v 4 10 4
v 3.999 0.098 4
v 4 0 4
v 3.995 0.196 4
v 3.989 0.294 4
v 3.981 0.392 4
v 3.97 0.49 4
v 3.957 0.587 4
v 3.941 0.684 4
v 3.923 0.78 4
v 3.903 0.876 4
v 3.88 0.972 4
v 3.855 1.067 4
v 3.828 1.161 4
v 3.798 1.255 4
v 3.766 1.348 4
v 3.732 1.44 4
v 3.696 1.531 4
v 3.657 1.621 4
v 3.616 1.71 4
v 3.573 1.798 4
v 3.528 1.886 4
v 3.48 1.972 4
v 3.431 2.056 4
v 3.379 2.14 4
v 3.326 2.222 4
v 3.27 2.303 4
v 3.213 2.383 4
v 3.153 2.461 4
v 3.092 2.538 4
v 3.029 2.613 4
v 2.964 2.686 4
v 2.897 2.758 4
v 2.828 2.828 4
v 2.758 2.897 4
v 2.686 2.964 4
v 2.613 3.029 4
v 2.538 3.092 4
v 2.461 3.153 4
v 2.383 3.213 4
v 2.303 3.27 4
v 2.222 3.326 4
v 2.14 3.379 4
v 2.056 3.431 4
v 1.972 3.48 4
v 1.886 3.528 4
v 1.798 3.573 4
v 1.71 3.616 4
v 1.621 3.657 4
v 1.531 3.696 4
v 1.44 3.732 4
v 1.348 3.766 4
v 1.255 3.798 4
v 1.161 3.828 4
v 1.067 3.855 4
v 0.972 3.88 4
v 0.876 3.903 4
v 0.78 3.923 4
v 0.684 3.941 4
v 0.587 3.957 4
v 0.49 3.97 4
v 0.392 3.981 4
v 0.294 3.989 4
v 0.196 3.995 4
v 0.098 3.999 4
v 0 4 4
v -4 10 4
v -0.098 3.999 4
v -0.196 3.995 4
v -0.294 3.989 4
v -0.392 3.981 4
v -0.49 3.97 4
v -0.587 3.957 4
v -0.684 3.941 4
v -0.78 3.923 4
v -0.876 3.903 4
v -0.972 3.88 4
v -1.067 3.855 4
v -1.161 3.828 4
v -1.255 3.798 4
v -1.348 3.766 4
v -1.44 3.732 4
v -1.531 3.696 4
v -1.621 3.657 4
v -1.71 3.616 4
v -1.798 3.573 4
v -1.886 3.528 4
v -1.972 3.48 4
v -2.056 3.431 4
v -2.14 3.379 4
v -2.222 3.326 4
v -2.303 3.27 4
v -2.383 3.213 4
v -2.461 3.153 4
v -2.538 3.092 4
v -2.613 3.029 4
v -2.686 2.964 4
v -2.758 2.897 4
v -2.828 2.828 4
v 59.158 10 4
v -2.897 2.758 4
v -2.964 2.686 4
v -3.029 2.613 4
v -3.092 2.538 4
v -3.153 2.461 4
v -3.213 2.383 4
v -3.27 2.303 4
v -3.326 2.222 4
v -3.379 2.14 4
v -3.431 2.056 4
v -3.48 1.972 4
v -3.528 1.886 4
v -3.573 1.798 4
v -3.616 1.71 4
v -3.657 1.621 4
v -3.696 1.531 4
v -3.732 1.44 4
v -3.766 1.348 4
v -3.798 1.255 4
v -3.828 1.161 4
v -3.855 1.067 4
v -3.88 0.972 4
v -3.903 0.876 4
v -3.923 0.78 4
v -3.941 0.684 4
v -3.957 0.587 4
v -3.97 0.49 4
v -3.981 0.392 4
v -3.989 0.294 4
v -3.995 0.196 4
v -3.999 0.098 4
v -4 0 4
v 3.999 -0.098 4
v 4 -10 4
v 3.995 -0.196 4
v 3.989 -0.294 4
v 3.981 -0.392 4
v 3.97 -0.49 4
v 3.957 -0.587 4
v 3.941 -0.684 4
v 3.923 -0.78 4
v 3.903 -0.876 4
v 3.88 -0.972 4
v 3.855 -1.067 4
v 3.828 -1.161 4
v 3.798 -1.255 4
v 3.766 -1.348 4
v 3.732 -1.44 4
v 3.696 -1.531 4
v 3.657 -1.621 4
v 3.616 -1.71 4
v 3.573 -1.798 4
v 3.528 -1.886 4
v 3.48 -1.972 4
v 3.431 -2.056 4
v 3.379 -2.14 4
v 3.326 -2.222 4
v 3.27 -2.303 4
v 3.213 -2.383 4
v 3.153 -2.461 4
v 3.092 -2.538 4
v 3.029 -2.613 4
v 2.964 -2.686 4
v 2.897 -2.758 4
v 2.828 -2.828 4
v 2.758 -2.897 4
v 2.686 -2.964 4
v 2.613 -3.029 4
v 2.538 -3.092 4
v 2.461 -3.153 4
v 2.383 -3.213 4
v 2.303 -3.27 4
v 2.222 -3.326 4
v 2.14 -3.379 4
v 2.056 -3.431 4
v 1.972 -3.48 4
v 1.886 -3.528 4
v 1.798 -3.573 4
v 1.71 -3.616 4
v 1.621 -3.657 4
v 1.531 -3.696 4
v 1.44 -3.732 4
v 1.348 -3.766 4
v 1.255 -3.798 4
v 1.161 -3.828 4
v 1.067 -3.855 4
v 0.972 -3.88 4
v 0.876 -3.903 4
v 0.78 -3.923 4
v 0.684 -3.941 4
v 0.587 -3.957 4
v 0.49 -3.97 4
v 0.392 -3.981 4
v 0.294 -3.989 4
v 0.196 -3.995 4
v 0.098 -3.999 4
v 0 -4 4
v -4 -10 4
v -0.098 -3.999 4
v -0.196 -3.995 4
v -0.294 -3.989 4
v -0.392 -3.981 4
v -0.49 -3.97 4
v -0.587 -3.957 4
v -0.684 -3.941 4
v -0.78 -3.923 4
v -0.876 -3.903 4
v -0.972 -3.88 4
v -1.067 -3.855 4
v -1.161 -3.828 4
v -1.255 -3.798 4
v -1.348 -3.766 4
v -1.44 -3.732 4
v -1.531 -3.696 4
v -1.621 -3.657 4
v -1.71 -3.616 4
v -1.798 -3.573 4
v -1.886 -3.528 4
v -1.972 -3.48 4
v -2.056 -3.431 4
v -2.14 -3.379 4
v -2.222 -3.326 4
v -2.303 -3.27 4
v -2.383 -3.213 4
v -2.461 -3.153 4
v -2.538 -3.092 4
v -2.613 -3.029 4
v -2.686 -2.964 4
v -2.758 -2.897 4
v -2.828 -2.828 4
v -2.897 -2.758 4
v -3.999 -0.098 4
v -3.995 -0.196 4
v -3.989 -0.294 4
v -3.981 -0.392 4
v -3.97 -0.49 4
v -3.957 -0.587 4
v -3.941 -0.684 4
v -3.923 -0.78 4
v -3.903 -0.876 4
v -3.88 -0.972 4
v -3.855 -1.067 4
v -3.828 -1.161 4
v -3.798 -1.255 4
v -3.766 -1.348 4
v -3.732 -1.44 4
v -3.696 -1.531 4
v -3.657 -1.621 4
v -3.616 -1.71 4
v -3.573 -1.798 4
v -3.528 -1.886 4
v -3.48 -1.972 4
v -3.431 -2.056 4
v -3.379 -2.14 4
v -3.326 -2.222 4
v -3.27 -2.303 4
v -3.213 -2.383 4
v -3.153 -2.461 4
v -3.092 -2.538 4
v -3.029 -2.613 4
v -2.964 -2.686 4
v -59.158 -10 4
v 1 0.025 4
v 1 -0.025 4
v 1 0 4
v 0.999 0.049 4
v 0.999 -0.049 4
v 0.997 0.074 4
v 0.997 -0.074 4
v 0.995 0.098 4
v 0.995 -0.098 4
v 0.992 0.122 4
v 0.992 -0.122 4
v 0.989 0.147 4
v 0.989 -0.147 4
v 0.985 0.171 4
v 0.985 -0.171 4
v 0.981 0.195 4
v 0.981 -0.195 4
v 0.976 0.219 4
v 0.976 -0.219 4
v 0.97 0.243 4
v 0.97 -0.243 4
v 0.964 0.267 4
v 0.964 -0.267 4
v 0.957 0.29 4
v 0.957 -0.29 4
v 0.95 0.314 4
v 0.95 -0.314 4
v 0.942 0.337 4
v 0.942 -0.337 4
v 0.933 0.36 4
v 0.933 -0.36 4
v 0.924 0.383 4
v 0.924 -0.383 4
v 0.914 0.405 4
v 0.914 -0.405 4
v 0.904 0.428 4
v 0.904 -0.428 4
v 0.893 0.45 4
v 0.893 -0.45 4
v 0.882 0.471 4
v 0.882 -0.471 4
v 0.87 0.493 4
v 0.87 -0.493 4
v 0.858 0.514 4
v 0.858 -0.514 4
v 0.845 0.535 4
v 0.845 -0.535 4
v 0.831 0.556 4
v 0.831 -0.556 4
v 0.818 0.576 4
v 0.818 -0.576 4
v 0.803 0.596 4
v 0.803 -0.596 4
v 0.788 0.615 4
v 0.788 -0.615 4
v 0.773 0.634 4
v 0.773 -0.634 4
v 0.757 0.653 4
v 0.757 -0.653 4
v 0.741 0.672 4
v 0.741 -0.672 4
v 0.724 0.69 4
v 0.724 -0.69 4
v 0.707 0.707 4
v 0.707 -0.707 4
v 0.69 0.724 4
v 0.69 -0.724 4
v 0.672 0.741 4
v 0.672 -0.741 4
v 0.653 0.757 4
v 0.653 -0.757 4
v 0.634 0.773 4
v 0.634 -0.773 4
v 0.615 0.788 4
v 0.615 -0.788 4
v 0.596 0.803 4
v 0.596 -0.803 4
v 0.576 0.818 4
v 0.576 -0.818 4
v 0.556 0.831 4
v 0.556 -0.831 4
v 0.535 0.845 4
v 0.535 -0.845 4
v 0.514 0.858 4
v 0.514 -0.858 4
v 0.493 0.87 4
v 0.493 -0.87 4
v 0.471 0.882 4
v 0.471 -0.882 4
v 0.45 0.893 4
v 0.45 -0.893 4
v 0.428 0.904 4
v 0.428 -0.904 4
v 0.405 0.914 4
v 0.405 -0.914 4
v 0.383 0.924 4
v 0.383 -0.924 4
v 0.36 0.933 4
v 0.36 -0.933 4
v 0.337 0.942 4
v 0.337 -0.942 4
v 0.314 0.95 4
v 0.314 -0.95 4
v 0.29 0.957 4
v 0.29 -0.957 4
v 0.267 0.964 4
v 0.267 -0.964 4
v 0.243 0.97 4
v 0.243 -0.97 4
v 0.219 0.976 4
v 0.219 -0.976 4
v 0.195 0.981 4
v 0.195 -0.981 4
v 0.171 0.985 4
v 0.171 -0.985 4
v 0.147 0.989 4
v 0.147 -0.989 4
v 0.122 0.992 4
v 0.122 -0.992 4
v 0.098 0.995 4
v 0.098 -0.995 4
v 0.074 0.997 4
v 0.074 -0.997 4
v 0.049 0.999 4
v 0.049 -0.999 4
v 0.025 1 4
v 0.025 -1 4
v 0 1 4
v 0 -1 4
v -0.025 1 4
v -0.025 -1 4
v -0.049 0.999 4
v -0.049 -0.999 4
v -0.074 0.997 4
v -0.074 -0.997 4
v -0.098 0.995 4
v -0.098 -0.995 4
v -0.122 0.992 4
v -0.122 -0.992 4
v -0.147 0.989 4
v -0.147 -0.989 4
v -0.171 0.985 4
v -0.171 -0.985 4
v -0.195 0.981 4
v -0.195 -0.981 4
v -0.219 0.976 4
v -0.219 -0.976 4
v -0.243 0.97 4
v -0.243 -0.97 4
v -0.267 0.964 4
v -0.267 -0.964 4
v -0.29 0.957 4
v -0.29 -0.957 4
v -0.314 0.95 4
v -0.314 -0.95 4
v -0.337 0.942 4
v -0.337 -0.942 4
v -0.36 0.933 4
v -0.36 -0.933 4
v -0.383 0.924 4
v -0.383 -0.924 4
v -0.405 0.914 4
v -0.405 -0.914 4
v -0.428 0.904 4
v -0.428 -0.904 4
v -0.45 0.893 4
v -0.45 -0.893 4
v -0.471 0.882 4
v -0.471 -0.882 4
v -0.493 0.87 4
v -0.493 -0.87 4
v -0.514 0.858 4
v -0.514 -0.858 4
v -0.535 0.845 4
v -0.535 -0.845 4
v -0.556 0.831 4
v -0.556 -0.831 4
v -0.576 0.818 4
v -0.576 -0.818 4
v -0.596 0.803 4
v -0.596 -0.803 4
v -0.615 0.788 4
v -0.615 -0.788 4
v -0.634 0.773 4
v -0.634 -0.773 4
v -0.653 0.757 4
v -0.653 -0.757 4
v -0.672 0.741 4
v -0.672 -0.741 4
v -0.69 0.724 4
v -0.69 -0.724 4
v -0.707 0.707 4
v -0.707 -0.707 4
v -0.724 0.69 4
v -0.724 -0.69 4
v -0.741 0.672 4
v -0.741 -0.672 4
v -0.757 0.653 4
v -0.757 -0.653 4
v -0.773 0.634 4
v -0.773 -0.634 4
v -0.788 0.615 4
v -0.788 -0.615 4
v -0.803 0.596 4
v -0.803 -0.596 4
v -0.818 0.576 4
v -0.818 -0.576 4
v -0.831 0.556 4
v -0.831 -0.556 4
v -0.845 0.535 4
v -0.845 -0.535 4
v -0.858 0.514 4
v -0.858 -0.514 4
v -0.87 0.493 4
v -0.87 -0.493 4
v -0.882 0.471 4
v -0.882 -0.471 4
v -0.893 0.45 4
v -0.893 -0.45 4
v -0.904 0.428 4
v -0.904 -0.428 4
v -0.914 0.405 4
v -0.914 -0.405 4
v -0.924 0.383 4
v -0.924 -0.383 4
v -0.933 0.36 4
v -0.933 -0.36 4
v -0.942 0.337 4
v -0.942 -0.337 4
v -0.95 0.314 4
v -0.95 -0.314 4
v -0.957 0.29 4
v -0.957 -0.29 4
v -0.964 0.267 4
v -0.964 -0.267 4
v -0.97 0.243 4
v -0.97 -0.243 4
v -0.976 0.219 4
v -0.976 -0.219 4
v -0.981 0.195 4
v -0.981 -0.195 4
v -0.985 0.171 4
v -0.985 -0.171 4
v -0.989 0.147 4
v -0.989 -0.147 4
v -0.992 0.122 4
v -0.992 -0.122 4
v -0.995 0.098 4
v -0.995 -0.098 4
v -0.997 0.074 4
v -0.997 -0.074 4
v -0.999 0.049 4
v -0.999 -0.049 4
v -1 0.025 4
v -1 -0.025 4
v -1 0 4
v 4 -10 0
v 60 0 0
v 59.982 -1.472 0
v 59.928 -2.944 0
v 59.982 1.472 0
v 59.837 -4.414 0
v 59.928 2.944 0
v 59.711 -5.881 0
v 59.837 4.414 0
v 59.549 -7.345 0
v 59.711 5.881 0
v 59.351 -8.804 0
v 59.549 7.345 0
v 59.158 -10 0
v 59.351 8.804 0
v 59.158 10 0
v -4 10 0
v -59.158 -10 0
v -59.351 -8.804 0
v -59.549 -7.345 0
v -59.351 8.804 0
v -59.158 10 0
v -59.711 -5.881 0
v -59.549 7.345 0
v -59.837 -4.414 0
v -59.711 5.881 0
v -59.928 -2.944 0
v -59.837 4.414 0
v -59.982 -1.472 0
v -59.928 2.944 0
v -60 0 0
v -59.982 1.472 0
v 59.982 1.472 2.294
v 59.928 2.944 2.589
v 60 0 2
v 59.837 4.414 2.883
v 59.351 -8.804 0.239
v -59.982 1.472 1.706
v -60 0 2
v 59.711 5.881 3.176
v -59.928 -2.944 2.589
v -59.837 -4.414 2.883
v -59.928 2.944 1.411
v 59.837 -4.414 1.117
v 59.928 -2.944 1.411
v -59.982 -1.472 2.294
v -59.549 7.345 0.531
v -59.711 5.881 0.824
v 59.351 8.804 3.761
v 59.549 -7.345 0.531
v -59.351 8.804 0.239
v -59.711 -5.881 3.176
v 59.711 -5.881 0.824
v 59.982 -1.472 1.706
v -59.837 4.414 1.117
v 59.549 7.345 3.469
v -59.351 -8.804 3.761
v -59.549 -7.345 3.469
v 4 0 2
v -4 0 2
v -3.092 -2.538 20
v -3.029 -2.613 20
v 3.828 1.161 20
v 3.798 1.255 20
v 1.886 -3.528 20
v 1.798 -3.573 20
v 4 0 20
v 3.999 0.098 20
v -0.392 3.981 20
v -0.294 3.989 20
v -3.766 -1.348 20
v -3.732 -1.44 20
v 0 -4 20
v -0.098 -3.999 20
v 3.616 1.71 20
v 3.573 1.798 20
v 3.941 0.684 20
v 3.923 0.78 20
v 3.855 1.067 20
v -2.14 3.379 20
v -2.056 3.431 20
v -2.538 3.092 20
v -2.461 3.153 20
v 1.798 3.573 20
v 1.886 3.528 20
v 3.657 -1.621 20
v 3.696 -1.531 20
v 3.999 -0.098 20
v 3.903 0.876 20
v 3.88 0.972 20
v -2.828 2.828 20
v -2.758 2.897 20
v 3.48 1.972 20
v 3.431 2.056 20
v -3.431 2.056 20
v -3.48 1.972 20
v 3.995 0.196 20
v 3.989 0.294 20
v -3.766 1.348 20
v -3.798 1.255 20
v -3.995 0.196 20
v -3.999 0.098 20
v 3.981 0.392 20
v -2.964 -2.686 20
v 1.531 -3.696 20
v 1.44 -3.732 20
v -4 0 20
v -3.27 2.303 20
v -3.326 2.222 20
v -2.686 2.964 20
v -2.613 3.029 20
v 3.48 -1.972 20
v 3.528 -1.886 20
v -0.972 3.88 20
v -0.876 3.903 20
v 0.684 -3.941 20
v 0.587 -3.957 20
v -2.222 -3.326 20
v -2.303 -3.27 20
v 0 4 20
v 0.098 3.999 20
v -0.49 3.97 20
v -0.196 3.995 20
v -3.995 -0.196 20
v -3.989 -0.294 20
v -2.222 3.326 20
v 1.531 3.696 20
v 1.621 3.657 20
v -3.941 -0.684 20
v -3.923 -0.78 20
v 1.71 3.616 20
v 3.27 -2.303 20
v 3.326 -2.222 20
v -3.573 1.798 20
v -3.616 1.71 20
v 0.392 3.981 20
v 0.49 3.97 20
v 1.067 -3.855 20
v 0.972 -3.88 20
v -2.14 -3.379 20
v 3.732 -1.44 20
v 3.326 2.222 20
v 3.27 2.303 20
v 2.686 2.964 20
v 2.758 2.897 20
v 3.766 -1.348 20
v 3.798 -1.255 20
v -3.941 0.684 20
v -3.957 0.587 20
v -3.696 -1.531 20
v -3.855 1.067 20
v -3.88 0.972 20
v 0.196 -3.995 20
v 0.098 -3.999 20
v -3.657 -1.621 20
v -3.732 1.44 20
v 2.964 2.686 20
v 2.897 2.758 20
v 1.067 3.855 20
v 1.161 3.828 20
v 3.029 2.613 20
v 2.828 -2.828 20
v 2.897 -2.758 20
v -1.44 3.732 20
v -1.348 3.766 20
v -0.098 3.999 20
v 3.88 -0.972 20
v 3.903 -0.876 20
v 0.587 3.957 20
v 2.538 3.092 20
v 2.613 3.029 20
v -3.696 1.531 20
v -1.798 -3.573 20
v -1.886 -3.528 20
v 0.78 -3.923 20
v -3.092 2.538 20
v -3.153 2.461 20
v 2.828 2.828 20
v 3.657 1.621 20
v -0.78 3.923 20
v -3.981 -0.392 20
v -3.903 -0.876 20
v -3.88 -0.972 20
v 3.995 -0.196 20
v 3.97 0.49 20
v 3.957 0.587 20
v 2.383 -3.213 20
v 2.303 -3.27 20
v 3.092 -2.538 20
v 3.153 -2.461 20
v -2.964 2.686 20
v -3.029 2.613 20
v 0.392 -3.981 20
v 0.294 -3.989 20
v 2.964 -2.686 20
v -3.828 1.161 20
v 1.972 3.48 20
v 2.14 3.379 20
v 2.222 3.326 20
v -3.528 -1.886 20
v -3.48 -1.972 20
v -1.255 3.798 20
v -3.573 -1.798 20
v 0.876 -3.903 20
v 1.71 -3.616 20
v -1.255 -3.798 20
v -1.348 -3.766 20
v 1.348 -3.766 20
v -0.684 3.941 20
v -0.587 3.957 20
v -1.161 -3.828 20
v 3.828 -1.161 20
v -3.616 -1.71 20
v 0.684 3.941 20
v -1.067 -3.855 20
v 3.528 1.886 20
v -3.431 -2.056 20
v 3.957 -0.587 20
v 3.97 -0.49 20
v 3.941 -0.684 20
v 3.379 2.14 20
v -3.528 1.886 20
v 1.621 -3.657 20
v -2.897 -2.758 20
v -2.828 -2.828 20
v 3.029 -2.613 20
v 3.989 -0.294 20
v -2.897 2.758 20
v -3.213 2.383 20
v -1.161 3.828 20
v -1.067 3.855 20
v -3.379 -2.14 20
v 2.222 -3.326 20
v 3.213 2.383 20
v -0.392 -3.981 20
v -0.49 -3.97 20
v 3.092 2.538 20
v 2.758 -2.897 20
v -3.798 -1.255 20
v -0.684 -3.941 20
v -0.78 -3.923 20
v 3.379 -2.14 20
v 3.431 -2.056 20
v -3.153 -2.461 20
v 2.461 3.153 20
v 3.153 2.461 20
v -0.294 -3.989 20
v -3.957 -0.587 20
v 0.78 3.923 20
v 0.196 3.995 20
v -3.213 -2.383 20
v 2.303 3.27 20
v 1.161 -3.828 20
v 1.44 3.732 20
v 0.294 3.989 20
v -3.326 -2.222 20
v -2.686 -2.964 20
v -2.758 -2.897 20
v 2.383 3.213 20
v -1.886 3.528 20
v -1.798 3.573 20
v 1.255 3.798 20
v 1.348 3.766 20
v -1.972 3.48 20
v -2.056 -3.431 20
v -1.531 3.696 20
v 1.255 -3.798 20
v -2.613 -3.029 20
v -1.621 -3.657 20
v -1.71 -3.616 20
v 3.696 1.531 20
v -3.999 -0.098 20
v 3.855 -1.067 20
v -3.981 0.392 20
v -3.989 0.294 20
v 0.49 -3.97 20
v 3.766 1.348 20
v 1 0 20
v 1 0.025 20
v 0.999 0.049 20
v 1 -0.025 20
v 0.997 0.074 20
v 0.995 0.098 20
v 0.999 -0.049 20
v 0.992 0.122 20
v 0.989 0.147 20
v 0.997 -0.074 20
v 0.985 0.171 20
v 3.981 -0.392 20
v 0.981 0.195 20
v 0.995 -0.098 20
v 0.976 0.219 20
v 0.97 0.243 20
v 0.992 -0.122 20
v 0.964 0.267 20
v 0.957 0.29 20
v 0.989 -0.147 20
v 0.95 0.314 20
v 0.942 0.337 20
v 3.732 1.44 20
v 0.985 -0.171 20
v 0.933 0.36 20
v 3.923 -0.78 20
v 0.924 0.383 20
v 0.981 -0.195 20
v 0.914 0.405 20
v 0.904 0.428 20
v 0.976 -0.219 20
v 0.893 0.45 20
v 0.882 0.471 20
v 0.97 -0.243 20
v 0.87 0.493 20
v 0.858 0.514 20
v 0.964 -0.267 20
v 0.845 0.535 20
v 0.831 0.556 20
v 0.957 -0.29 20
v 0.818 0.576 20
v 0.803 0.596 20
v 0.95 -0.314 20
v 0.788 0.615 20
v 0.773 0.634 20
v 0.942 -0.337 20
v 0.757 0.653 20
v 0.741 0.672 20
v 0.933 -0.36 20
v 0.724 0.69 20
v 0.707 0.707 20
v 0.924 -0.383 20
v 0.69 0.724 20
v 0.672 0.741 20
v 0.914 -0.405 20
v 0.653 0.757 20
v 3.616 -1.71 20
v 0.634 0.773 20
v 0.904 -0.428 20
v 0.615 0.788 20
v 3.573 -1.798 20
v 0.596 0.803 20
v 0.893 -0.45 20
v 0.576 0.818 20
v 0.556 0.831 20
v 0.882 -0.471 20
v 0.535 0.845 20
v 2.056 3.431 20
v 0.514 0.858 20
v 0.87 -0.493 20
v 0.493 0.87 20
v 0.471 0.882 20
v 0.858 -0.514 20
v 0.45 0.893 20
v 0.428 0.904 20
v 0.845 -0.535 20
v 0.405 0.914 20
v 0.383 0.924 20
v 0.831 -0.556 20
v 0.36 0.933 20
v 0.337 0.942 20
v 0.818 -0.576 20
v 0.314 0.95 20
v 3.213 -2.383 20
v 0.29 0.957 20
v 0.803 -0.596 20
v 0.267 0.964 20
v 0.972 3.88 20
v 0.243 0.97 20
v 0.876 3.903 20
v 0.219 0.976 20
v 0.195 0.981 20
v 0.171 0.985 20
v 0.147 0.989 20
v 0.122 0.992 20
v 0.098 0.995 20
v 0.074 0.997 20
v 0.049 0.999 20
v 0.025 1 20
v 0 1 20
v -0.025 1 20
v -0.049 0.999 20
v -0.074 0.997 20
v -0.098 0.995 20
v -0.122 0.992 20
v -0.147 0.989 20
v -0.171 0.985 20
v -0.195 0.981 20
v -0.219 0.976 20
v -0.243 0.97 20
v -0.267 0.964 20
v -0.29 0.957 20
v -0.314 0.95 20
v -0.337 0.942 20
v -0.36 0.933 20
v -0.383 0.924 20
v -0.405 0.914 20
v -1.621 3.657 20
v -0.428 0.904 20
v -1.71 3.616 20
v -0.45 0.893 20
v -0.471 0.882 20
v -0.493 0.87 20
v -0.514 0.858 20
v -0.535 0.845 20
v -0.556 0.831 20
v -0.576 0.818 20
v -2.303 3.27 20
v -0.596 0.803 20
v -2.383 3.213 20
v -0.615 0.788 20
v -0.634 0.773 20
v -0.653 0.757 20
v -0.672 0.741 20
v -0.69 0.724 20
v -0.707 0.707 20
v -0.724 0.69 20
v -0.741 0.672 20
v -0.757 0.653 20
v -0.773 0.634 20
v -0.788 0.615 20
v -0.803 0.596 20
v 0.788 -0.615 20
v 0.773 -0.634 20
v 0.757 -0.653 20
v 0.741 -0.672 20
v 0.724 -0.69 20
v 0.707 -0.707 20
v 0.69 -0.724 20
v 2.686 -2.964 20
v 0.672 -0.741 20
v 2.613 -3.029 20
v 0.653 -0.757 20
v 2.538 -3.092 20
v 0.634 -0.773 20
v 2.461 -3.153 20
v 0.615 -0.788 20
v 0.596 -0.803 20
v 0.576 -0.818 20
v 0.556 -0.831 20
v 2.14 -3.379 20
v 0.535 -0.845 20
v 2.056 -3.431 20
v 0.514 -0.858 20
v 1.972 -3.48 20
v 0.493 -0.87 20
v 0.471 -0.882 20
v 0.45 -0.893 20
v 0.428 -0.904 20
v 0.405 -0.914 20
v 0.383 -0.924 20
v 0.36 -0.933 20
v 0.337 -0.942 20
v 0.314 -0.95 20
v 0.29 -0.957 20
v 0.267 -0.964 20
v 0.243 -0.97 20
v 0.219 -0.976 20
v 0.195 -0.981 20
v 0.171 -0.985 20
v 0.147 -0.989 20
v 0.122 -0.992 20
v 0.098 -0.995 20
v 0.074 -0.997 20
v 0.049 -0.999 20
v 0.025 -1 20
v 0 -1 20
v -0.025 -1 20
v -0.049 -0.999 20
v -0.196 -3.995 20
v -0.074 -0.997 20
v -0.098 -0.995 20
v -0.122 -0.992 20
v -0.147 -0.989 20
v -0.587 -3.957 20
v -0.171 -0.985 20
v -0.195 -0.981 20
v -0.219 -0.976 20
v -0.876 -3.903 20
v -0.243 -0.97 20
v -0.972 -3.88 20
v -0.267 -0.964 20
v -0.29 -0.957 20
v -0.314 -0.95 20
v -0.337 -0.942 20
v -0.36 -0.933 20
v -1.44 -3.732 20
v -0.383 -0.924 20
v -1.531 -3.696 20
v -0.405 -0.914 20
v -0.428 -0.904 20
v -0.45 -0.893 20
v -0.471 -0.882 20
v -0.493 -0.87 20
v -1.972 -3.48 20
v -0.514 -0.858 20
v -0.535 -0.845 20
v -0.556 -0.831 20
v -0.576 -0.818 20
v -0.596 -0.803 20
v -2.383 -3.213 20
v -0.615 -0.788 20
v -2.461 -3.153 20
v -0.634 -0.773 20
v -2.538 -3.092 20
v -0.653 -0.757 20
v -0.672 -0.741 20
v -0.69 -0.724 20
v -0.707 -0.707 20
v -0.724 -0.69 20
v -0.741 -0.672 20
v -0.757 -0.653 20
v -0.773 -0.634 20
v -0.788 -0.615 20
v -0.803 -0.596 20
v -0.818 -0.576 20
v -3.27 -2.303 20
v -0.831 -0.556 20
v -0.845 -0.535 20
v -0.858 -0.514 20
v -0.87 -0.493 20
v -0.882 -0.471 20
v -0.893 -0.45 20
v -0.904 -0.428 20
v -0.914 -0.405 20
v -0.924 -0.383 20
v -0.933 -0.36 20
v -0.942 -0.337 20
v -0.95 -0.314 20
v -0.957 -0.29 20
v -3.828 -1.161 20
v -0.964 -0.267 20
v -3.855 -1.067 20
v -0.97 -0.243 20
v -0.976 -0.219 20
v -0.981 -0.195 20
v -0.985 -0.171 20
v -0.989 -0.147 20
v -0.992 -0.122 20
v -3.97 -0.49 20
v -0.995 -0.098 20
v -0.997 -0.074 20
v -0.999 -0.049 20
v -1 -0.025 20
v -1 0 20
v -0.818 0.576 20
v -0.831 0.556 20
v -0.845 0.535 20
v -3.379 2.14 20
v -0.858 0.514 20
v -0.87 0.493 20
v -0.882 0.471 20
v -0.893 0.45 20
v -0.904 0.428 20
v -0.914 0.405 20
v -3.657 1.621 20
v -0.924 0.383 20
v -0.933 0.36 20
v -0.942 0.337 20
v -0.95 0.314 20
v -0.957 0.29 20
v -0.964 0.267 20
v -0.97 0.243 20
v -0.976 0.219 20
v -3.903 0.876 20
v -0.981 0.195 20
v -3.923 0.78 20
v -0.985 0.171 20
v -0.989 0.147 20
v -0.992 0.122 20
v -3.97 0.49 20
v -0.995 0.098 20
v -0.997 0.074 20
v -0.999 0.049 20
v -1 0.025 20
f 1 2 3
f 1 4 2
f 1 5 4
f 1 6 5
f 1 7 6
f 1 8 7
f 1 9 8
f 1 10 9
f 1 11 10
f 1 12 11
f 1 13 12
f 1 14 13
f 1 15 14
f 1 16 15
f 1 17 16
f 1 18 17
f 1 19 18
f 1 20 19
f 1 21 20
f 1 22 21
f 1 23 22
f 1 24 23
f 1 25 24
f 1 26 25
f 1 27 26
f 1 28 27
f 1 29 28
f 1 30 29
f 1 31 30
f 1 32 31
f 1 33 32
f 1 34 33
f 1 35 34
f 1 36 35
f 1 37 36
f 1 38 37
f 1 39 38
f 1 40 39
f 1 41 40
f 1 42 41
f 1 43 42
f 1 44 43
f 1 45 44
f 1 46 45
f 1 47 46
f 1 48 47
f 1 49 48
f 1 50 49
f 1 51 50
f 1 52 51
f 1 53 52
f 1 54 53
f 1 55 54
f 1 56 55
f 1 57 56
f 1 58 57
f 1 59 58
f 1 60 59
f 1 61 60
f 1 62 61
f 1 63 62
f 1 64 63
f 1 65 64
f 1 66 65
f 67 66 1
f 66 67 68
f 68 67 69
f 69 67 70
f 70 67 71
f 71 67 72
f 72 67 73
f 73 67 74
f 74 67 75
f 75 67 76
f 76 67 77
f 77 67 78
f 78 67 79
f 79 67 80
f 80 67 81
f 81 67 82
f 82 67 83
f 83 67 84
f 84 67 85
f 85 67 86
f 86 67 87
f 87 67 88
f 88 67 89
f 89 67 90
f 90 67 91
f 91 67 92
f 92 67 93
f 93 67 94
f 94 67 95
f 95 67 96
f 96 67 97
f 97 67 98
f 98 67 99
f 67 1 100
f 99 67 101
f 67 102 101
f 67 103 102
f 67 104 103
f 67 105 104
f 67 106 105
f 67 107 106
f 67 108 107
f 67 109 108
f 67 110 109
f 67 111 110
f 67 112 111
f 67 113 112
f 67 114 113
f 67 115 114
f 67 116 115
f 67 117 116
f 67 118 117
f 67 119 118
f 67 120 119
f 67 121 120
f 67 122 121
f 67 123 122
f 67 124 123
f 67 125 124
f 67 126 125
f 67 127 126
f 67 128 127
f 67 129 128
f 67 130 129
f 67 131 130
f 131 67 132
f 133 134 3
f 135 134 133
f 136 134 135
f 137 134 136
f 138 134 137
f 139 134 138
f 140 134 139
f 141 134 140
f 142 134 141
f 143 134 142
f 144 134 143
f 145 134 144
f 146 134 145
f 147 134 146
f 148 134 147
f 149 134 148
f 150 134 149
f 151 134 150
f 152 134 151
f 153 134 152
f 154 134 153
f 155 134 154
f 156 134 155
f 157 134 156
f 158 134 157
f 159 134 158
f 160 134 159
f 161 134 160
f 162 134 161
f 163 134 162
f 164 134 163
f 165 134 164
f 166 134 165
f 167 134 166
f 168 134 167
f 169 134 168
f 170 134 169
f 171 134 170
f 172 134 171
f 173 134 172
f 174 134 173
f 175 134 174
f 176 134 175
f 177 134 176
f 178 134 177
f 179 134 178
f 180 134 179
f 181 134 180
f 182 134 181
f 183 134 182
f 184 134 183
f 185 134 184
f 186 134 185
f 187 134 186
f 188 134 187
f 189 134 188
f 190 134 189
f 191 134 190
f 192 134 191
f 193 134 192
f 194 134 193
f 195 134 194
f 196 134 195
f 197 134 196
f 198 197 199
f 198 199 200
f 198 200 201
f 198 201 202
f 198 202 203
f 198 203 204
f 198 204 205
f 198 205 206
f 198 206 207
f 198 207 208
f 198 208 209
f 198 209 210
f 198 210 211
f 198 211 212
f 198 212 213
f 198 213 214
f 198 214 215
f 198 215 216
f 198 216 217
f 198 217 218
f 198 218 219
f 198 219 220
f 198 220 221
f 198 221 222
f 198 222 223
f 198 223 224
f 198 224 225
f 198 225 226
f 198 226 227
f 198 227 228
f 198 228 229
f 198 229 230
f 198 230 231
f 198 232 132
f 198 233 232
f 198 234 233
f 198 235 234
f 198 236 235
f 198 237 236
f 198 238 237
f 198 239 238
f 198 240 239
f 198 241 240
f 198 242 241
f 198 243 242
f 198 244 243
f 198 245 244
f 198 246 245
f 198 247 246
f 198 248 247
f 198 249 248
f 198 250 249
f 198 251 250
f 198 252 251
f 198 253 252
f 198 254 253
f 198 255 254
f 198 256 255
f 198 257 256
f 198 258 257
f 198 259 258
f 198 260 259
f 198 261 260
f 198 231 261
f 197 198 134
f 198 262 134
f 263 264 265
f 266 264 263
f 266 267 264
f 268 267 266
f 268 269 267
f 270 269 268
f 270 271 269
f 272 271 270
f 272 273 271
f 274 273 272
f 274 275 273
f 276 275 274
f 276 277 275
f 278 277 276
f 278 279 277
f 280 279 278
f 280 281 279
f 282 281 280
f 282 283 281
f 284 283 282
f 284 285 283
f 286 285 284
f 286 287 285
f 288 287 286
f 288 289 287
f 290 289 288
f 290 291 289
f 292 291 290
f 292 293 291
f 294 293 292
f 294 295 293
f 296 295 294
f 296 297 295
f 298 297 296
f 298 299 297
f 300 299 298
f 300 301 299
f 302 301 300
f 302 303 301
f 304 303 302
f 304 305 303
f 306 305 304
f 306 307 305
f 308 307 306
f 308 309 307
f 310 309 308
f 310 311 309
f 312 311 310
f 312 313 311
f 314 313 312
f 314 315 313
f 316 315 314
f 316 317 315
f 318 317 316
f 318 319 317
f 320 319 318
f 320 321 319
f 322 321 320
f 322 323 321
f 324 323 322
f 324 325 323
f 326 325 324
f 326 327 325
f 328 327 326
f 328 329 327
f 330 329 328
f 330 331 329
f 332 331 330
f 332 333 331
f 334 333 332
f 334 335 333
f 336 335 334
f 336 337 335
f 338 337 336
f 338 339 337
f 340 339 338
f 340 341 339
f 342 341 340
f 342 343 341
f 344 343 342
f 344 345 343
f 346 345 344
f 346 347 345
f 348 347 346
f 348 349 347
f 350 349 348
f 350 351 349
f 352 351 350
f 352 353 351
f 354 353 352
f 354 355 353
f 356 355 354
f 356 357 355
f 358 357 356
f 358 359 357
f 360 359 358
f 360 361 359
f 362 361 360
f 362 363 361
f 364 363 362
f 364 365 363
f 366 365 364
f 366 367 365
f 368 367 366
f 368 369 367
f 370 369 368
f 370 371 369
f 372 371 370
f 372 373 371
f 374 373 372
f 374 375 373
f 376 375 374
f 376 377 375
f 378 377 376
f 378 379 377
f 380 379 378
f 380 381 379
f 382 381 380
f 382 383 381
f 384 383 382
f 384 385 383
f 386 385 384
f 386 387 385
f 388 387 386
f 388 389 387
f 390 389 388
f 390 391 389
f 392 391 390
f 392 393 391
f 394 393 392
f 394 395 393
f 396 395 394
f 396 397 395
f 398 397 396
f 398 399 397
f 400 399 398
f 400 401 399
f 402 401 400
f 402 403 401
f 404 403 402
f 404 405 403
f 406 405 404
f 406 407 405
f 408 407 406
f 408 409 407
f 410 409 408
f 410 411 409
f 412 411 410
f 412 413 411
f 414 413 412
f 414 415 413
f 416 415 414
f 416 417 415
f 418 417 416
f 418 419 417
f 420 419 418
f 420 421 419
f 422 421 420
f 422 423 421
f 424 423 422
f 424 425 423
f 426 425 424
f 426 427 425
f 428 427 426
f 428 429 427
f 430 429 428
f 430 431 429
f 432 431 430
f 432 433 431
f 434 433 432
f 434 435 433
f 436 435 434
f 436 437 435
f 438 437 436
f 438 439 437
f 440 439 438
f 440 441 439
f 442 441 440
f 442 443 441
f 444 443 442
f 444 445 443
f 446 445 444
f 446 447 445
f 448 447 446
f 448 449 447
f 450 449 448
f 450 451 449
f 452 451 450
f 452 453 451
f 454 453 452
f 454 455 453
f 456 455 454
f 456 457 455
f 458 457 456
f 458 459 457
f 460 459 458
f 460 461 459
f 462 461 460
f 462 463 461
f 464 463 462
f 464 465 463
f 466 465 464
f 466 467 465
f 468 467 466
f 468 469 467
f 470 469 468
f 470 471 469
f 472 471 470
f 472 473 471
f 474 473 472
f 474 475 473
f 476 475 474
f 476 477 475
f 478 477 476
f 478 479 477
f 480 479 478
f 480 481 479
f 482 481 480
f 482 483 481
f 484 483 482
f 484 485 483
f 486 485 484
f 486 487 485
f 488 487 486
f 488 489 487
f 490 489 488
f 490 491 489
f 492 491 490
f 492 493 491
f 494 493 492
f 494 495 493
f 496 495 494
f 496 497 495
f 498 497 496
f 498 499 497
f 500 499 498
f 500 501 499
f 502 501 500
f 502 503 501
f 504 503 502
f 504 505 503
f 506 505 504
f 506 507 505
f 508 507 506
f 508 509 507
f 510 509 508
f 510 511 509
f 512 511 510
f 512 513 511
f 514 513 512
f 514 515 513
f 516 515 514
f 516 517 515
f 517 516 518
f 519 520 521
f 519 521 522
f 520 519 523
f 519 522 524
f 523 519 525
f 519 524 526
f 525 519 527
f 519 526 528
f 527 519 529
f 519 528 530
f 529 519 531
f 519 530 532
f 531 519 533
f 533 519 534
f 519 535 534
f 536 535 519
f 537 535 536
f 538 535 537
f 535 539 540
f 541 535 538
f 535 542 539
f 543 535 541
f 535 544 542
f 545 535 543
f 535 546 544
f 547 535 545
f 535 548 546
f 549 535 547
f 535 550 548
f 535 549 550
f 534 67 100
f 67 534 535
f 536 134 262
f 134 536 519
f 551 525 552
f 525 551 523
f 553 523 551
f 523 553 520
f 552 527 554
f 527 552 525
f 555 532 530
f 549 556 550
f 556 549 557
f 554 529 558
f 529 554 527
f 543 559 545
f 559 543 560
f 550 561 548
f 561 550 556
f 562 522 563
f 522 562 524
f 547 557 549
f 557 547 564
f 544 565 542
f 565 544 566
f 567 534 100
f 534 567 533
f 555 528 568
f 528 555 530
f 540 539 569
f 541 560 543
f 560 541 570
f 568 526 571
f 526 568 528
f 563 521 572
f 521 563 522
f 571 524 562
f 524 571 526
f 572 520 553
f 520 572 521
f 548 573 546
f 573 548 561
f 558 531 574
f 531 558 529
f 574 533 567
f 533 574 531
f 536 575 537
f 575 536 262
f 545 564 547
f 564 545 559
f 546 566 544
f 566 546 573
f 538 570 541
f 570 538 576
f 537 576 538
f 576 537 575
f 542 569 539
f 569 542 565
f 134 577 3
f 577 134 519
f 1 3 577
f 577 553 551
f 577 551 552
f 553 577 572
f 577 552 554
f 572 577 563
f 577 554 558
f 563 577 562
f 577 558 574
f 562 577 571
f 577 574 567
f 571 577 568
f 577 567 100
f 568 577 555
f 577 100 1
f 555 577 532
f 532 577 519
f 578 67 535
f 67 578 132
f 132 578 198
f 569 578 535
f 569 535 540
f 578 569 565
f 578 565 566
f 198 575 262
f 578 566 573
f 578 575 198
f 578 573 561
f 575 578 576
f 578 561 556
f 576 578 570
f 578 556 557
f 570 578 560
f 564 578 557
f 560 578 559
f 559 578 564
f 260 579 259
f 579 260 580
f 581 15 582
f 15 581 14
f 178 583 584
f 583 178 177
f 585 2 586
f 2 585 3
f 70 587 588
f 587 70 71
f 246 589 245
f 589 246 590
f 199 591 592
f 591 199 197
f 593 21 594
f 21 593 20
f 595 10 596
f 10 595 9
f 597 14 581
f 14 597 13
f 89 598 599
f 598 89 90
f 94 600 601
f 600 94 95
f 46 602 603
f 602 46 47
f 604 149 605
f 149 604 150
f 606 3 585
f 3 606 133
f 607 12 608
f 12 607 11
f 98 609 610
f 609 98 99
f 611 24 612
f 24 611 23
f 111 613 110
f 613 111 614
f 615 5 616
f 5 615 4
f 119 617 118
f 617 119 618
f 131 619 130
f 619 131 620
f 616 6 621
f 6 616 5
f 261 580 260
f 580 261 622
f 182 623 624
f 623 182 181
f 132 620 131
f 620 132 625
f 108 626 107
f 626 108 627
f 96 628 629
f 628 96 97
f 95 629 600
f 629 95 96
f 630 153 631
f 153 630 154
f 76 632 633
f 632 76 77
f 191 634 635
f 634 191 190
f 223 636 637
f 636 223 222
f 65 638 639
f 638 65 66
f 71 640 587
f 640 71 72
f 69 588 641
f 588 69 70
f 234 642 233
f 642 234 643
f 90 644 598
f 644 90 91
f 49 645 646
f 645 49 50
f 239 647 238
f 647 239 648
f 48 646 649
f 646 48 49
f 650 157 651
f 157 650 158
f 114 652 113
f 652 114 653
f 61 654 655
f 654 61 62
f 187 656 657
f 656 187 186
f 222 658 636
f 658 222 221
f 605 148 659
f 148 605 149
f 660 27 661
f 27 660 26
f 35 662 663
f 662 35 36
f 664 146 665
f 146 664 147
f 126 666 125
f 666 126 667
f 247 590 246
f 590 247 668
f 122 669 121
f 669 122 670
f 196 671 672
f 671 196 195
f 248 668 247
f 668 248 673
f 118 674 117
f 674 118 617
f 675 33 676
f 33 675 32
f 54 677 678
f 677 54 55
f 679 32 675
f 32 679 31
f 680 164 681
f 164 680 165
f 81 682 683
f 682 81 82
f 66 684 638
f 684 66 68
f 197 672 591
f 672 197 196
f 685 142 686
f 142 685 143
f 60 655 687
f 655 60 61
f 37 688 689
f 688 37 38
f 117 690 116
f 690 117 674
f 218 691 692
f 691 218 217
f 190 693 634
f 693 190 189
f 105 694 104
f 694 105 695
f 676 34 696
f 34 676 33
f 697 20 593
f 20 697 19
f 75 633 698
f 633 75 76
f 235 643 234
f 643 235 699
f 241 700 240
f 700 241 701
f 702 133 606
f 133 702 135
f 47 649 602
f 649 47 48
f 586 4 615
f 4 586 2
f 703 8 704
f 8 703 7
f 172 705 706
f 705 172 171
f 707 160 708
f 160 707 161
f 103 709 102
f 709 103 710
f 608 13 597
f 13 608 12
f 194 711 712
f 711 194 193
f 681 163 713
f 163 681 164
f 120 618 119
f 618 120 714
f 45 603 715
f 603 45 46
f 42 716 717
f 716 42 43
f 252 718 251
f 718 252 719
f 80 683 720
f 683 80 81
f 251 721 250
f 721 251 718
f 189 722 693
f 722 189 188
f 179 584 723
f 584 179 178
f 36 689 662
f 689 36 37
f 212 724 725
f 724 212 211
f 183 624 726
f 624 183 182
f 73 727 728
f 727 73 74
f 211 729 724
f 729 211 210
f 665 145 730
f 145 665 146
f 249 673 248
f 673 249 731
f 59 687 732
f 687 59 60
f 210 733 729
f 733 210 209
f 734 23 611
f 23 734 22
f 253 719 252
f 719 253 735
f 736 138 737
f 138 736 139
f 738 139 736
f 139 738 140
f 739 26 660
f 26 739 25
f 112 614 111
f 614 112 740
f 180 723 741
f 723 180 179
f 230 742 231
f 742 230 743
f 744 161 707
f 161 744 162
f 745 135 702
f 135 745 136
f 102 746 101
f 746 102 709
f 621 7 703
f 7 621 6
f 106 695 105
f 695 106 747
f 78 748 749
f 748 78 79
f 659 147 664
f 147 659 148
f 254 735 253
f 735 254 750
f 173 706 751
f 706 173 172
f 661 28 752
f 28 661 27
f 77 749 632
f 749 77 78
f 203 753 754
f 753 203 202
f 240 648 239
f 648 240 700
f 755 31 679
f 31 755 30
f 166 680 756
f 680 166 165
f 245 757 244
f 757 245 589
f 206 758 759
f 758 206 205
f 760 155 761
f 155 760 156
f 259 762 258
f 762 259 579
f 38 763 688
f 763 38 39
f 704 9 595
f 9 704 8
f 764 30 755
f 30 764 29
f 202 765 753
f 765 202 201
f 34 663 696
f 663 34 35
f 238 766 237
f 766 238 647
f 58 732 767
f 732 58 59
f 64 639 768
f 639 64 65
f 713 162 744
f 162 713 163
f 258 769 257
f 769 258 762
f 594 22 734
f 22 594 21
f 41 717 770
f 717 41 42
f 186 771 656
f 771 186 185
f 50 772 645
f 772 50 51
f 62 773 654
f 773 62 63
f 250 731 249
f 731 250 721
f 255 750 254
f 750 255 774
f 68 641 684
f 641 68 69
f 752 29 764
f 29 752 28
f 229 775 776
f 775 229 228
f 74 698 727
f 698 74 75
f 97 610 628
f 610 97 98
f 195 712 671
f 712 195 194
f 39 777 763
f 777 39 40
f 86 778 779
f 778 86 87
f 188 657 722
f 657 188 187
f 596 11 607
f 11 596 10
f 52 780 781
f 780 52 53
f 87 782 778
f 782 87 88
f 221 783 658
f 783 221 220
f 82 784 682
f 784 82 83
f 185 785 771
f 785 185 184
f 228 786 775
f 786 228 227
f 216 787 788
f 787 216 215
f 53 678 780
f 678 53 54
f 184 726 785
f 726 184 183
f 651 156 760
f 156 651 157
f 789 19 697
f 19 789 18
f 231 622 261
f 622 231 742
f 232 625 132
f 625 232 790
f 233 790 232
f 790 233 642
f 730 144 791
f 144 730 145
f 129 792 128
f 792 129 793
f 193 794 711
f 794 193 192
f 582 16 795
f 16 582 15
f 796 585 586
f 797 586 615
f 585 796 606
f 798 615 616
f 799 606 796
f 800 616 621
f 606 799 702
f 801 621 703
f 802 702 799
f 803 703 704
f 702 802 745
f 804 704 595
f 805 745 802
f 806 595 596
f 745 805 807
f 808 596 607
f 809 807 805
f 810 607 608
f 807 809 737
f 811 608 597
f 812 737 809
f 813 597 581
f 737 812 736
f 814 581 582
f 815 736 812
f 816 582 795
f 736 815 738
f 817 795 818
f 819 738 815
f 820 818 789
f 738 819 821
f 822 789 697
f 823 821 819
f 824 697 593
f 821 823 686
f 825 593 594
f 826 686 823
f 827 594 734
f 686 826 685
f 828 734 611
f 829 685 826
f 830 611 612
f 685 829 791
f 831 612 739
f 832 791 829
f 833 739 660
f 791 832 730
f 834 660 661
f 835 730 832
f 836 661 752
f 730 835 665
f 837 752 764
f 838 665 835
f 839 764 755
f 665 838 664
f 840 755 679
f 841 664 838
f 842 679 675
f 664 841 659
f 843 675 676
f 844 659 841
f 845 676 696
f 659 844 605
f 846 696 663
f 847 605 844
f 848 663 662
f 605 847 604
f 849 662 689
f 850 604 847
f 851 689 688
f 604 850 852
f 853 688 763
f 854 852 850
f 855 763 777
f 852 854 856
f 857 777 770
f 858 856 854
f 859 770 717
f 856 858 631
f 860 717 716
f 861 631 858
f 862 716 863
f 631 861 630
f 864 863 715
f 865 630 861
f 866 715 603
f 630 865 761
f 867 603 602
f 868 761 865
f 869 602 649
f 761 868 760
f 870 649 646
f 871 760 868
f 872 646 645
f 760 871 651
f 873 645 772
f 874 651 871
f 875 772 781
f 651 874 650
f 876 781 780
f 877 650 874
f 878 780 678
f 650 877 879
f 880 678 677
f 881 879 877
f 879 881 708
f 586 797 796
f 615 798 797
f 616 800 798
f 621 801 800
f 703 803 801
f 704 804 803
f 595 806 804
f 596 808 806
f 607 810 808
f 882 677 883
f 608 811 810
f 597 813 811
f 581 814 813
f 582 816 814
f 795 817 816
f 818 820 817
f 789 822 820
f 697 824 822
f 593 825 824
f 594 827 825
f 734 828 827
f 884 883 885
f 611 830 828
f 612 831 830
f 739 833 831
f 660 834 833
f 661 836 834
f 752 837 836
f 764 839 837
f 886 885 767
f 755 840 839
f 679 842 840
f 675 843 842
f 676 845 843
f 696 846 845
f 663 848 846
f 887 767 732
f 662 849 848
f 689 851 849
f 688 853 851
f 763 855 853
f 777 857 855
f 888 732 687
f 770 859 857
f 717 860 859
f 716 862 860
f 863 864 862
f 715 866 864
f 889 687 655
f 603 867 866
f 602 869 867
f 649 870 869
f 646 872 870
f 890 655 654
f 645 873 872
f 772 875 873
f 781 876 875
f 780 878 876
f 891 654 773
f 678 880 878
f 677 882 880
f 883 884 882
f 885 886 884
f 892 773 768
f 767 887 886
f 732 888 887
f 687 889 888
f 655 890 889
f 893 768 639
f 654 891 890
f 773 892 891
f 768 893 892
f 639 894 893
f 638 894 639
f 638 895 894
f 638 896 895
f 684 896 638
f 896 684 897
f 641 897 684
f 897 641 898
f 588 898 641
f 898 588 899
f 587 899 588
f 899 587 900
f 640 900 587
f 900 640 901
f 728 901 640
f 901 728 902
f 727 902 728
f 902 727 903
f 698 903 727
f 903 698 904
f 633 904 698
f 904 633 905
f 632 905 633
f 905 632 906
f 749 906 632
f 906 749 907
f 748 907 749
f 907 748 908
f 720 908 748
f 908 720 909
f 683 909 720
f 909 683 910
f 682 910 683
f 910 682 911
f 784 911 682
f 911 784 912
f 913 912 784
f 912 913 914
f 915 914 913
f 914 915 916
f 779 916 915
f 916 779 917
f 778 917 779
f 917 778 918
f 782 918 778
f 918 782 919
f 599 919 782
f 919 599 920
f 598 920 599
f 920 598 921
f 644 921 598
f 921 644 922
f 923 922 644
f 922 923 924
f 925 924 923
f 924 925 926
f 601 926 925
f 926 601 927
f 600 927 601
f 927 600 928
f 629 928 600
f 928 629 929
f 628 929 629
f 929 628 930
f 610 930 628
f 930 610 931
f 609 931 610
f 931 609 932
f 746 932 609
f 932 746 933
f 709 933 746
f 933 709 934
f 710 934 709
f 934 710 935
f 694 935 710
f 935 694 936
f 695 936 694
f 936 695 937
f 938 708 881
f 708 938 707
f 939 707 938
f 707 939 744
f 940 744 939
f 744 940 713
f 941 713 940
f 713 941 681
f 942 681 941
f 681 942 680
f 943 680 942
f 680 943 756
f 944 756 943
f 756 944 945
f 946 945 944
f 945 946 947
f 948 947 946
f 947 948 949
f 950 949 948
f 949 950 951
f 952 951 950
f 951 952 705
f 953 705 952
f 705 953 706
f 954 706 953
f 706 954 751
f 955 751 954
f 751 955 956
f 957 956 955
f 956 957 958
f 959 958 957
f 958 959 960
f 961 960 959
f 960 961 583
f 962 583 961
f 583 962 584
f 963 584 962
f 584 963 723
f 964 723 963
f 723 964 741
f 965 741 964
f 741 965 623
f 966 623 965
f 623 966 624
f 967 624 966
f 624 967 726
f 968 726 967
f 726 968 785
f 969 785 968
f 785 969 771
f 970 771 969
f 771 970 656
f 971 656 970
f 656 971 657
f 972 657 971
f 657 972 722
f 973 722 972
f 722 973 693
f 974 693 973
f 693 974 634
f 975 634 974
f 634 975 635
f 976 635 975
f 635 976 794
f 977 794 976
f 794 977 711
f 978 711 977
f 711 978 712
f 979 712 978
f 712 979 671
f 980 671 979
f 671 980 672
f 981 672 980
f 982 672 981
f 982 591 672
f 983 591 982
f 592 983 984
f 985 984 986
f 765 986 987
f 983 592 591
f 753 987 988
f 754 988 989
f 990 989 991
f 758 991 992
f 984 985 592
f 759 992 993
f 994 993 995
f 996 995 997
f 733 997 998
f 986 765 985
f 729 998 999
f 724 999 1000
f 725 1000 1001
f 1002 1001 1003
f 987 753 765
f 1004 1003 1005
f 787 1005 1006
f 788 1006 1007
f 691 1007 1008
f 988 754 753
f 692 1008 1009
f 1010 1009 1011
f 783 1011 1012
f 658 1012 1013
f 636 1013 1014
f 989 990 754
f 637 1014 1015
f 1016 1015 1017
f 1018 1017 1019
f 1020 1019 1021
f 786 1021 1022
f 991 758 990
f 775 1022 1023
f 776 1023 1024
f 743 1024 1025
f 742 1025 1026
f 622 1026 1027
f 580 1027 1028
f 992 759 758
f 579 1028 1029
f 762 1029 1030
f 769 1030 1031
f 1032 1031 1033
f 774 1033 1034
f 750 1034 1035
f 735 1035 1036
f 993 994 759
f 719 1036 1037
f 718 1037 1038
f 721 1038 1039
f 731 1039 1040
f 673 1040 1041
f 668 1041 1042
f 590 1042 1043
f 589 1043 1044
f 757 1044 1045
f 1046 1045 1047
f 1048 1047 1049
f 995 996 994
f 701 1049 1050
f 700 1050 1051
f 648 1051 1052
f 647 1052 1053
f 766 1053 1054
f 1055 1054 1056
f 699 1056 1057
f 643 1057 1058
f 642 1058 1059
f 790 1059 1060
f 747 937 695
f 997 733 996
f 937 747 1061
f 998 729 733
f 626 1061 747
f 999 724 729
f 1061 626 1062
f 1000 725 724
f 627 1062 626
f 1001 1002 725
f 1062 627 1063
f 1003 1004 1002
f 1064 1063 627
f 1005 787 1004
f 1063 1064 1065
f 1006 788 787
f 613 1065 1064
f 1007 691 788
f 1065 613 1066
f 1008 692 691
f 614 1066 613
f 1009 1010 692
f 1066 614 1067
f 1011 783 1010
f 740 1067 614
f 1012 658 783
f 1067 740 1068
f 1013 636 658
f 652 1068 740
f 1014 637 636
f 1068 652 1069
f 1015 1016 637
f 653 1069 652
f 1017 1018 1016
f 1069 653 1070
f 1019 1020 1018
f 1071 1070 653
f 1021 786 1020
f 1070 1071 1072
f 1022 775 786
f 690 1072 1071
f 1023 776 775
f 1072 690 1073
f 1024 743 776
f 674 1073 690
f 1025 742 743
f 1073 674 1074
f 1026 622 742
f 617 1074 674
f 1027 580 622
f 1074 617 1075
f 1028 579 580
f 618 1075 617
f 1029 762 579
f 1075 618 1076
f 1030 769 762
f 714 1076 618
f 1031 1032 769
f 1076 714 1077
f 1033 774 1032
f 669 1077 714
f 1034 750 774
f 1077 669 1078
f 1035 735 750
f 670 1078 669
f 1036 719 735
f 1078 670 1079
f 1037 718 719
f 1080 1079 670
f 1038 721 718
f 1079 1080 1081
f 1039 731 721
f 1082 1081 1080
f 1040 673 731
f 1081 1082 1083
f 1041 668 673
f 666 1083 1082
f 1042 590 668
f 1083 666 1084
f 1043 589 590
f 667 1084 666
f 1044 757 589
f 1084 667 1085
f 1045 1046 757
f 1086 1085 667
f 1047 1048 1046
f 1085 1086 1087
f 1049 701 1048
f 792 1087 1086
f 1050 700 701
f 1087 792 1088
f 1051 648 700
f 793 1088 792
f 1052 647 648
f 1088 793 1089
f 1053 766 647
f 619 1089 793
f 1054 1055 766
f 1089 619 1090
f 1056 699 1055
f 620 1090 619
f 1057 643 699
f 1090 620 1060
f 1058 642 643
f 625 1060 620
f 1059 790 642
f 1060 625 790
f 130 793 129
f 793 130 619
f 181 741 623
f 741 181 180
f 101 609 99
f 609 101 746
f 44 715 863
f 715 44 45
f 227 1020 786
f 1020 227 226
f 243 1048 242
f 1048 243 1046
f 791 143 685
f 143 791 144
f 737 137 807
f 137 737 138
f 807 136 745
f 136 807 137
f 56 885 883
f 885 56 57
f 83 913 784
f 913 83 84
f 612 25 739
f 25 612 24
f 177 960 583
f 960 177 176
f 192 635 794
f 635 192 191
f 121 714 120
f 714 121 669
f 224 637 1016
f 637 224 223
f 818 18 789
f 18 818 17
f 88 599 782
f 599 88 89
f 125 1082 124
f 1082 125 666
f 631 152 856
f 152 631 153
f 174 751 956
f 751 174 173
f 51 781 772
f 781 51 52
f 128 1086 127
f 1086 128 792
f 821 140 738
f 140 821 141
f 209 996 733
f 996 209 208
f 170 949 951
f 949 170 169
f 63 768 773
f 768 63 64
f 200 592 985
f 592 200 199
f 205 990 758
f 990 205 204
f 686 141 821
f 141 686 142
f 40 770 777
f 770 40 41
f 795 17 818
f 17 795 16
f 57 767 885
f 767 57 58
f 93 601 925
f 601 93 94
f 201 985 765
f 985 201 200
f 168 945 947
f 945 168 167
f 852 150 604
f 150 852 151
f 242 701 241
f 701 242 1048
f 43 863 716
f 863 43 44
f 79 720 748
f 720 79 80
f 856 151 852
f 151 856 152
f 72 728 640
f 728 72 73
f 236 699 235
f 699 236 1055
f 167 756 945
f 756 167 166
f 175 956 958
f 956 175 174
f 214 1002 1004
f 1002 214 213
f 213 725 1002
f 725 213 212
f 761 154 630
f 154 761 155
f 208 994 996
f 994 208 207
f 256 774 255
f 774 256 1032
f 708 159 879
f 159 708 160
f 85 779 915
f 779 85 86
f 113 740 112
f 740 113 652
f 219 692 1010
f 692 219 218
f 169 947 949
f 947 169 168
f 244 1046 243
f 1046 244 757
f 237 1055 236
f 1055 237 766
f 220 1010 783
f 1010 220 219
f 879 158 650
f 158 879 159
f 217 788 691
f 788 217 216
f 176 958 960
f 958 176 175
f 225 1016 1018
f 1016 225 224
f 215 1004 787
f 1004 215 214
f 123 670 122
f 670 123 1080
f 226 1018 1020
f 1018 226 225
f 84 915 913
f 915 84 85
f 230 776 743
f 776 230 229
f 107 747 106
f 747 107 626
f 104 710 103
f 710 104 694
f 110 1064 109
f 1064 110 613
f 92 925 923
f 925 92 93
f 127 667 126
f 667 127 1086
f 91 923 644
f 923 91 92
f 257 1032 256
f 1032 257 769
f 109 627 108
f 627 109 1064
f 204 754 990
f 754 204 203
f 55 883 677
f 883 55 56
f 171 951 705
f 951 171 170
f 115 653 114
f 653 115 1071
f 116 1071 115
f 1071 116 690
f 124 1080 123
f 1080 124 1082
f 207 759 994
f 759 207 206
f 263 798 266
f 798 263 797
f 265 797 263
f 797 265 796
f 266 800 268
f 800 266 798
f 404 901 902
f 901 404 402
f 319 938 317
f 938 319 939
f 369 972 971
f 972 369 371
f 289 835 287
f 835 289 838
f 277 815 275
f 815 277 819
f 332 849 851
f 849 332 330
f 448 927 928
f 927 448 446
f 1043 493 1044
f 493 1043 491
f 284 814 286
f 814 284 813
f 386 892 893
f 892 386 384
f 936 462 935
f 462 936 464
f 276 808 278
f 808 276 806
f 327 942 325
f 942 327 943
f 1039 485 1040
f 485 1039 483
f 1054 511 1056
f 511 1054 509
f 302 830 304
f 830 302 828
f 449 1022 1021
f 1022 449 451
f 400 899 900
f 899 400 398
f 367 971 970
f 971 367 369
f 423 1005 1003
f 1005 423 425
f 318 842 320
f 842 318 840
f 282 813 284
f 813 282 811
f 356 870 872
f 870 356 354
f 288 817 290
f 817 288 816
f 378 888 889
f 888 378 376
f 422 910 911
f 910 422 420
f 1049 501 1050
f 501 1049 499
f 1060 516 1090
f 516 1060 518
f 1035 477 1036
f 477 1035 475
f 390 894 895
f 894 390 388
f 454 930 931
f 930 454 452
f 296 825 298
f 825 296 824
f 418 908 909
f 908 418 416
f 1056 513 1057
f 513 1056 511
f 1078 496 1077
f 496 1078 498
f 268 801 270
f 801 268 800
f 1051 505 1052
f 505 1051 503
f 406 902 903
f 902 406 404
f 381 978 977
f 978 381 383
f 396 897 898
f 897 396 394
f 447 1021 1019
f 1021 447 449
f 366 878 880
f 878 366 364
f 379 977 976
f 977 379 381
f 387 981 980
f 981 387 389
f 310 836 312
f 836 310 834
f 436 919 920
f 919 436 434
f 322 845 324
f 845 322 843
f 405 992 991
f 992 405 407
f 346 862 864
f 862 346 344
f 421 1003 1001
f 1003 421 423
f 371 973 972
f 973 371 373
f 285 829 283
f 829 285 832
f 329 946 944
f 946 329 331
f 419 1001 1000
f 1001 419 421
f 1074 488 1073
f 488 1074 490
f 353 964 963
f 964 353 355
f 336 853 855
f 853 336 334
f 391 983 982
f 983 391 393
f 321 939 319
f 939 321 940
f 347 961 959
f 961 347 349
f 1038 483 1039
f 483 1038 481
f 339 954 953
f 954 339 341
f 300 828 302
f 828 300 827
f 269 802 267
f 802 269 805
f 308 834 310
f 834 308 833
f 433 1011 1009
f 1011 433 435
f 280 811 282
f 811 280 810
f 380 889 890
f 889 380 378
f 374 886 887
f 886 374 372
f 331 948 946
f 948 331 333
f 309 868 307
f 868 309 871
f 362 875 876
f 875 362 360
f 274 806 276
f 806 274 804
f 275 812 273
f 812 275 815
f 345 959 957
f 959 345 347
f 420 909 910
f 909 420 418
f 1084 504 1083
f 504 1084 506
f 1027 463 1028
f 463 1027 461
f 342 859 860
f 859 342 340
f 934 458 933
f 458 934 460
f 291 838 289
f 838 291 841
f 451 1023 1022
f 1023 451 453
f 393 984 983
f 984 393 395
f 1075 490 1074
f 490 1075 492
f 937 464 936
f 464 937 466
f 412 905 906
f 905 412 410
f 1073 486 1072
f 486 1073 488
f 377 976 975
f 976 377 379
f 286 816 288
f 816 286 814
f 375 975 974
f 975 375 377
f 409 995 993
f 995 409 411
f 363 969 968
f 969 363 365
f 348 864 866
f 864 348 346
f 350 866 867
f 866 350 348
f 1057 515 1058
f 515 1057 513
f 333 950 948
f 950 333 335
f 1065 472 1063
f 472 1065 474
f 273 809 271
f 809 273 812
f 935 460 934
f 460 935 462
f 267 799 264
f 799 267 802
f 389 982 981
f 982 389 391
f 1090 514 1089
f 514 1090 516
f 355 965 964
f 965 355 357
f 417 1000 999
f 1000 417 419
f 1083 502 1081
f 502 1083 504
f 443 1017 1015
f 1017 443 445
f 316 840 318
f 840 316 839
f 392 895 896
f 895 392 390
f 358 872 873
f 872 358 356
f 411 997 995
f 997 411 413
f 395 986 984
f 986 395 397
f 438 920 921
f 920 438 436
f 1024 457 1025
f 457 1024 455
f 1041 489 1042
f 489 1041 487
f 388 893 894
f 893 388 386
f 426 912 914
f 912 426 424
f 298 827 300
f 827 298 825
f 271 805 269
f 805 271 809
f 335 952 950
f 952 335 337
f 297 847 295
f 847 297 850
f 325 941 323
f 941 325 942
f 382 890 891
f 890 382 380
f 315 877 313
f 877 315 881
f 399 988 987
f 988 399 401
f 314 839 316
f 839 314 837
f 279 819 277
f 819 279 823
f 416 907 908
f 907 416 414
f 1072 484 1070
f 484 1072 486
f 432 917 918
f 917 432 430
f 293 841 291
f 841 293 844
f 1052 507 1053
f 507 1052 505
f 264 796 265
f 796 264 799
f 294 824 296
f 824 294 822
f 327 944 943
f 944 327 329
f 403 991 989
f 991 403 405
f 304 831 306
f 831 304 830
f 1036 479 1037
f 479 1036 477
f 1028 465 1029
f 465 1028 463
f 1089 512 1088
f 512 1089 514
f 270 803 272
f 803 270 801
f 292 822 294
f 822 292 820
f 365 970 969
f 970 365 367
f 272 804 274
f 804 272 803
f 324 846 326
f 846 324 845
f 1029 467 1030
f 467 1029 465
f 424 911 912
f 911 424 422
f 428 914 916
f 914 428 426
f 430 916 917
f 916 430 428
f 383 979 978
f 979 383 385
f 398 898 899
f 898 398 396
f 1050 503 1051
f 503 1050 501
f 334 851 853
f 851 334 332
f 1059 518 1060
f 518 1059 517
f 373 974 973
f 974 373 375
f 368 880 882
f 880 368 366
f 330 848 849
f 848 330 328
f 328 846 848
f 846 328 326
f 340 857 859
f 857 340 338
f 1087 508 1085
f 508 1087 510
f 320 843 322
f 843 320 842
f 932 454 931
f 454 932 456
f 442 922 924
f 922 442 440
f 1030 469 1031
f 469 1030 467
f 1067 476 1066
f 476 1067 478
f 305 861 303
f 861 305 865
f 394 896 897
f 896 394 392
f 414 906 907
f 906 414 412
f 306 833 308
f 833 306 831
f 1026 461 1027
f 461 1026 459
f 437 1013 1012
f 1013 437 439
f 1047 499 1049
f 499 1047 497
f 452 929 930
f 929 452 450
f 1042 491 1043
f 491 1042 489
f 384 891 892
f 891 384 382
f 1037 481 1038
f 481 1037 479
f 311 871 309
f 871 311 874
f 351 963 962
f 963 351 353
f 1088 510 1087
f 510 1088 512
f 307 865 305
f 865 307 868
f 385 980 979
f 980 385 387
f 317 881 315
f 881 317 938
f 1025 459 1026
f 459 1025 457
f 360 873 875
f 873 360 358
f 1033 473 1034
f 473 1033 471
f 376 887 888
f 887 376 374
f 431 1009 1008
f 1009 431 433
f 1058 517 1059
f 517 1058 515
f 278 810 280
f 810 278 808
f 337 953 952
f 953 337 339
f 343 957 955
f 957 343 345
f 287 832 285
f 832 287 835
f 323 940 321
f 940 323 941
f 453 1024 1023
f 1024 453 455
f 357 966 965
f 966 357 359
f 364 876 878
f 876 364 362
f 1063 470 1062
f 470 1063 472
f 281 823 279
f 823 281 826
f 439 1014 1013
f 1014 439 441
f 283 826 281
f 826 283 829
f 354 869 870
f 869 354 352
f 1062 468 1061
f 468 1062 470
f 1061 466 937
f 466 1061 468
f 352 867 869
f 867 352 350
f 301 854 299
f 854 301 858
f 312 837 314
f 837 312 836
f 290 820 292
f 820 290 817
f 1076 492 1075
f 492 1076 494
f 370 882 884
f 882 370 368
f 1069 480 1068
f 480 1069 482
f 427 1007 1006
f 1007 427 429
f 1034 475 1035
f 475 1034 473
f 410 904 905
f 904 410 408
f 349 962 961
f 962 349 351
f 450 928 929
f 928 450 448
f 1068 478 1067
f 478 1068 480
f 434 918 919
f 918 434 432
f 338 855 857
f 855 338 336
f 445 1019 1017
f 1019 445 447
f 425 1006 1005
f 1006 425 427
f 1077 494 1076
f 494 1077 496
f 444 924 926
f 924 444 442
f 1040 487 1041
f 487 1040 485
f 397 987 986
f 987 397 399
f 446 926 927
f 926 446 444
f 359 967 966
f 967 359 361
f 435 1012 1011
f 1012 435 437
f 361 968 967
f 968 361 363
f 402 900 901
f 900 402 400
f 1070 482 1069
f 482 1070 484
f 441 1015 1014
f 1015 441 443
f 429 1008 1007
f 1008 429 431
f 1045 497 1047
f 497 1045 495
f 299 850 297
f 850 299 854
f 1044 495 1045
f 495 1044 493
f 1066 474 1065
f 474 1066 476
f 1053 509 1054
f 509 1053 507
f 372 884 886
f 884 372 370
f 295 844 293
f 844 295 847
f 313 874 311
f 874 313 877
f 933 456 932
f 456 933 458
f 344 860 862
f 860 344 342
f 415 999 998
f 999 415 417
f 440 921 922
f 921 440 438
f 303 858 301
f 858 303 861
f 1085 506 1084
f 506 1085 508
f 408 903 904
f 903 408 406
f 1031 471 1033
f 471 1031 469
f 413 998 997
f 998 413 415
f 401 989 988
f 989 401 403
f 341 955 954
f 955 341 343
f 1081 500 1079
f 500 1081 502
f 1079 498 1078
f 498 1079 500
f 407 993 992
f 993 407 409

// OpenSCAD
$fn = 256;

width_lemet = 120;
depth_lemet = 20;
height_lemet = 4;

//shaft
height_shaft = 20;
width_shaft_r = 4; 
bore_shaft_r = 1;


// lemet
difference(){
    
difference(){
    translate([0,0,height_lemet/2]) cube([width_lemet, depth_lemet, height_lemet], center= true);
    
        //outside cut-out to provide smooth rotation.
        difference(){
        translate([0,0,height_lemet/2]) cube([width_lemet, depth_lemet, height_lemet], center= true);
        translate([0,0,height_lemet/2]) cylinder(h = height_lemet, r = width_lemet/2, center= true);
        }
}

translate([width_shaft_r,-depth_lemet/2, 0]) 
rotate([atan(height_lemet/depth_lemet),0, 0]) 
cube([width_lemet/2-width_shaft_r, sqrt(depth_lemet^2+width_shaft_r^2), height_lemet]);

rotate([0,0,180])
translate([width_shaft_r,-depth_lemet/2, 0]) 
rotate([atan(height_lemet/depth_lemet),0, 0]) 
cube([width_lemet/2-width_shaft_r, sqrt(depth_lemet^2+width_shaft_r^2), height_lemet]);
}

difference(){
    translate([0 , 0, height_shaft/2]) cylinder(h = height_shaft, r = width_shaft_r, center = true);
    translate([0 , 0, height_shaft/2]) cylinder(h = height_shaft, r = bore_shaft_r, center = true);
}

//create lemet
